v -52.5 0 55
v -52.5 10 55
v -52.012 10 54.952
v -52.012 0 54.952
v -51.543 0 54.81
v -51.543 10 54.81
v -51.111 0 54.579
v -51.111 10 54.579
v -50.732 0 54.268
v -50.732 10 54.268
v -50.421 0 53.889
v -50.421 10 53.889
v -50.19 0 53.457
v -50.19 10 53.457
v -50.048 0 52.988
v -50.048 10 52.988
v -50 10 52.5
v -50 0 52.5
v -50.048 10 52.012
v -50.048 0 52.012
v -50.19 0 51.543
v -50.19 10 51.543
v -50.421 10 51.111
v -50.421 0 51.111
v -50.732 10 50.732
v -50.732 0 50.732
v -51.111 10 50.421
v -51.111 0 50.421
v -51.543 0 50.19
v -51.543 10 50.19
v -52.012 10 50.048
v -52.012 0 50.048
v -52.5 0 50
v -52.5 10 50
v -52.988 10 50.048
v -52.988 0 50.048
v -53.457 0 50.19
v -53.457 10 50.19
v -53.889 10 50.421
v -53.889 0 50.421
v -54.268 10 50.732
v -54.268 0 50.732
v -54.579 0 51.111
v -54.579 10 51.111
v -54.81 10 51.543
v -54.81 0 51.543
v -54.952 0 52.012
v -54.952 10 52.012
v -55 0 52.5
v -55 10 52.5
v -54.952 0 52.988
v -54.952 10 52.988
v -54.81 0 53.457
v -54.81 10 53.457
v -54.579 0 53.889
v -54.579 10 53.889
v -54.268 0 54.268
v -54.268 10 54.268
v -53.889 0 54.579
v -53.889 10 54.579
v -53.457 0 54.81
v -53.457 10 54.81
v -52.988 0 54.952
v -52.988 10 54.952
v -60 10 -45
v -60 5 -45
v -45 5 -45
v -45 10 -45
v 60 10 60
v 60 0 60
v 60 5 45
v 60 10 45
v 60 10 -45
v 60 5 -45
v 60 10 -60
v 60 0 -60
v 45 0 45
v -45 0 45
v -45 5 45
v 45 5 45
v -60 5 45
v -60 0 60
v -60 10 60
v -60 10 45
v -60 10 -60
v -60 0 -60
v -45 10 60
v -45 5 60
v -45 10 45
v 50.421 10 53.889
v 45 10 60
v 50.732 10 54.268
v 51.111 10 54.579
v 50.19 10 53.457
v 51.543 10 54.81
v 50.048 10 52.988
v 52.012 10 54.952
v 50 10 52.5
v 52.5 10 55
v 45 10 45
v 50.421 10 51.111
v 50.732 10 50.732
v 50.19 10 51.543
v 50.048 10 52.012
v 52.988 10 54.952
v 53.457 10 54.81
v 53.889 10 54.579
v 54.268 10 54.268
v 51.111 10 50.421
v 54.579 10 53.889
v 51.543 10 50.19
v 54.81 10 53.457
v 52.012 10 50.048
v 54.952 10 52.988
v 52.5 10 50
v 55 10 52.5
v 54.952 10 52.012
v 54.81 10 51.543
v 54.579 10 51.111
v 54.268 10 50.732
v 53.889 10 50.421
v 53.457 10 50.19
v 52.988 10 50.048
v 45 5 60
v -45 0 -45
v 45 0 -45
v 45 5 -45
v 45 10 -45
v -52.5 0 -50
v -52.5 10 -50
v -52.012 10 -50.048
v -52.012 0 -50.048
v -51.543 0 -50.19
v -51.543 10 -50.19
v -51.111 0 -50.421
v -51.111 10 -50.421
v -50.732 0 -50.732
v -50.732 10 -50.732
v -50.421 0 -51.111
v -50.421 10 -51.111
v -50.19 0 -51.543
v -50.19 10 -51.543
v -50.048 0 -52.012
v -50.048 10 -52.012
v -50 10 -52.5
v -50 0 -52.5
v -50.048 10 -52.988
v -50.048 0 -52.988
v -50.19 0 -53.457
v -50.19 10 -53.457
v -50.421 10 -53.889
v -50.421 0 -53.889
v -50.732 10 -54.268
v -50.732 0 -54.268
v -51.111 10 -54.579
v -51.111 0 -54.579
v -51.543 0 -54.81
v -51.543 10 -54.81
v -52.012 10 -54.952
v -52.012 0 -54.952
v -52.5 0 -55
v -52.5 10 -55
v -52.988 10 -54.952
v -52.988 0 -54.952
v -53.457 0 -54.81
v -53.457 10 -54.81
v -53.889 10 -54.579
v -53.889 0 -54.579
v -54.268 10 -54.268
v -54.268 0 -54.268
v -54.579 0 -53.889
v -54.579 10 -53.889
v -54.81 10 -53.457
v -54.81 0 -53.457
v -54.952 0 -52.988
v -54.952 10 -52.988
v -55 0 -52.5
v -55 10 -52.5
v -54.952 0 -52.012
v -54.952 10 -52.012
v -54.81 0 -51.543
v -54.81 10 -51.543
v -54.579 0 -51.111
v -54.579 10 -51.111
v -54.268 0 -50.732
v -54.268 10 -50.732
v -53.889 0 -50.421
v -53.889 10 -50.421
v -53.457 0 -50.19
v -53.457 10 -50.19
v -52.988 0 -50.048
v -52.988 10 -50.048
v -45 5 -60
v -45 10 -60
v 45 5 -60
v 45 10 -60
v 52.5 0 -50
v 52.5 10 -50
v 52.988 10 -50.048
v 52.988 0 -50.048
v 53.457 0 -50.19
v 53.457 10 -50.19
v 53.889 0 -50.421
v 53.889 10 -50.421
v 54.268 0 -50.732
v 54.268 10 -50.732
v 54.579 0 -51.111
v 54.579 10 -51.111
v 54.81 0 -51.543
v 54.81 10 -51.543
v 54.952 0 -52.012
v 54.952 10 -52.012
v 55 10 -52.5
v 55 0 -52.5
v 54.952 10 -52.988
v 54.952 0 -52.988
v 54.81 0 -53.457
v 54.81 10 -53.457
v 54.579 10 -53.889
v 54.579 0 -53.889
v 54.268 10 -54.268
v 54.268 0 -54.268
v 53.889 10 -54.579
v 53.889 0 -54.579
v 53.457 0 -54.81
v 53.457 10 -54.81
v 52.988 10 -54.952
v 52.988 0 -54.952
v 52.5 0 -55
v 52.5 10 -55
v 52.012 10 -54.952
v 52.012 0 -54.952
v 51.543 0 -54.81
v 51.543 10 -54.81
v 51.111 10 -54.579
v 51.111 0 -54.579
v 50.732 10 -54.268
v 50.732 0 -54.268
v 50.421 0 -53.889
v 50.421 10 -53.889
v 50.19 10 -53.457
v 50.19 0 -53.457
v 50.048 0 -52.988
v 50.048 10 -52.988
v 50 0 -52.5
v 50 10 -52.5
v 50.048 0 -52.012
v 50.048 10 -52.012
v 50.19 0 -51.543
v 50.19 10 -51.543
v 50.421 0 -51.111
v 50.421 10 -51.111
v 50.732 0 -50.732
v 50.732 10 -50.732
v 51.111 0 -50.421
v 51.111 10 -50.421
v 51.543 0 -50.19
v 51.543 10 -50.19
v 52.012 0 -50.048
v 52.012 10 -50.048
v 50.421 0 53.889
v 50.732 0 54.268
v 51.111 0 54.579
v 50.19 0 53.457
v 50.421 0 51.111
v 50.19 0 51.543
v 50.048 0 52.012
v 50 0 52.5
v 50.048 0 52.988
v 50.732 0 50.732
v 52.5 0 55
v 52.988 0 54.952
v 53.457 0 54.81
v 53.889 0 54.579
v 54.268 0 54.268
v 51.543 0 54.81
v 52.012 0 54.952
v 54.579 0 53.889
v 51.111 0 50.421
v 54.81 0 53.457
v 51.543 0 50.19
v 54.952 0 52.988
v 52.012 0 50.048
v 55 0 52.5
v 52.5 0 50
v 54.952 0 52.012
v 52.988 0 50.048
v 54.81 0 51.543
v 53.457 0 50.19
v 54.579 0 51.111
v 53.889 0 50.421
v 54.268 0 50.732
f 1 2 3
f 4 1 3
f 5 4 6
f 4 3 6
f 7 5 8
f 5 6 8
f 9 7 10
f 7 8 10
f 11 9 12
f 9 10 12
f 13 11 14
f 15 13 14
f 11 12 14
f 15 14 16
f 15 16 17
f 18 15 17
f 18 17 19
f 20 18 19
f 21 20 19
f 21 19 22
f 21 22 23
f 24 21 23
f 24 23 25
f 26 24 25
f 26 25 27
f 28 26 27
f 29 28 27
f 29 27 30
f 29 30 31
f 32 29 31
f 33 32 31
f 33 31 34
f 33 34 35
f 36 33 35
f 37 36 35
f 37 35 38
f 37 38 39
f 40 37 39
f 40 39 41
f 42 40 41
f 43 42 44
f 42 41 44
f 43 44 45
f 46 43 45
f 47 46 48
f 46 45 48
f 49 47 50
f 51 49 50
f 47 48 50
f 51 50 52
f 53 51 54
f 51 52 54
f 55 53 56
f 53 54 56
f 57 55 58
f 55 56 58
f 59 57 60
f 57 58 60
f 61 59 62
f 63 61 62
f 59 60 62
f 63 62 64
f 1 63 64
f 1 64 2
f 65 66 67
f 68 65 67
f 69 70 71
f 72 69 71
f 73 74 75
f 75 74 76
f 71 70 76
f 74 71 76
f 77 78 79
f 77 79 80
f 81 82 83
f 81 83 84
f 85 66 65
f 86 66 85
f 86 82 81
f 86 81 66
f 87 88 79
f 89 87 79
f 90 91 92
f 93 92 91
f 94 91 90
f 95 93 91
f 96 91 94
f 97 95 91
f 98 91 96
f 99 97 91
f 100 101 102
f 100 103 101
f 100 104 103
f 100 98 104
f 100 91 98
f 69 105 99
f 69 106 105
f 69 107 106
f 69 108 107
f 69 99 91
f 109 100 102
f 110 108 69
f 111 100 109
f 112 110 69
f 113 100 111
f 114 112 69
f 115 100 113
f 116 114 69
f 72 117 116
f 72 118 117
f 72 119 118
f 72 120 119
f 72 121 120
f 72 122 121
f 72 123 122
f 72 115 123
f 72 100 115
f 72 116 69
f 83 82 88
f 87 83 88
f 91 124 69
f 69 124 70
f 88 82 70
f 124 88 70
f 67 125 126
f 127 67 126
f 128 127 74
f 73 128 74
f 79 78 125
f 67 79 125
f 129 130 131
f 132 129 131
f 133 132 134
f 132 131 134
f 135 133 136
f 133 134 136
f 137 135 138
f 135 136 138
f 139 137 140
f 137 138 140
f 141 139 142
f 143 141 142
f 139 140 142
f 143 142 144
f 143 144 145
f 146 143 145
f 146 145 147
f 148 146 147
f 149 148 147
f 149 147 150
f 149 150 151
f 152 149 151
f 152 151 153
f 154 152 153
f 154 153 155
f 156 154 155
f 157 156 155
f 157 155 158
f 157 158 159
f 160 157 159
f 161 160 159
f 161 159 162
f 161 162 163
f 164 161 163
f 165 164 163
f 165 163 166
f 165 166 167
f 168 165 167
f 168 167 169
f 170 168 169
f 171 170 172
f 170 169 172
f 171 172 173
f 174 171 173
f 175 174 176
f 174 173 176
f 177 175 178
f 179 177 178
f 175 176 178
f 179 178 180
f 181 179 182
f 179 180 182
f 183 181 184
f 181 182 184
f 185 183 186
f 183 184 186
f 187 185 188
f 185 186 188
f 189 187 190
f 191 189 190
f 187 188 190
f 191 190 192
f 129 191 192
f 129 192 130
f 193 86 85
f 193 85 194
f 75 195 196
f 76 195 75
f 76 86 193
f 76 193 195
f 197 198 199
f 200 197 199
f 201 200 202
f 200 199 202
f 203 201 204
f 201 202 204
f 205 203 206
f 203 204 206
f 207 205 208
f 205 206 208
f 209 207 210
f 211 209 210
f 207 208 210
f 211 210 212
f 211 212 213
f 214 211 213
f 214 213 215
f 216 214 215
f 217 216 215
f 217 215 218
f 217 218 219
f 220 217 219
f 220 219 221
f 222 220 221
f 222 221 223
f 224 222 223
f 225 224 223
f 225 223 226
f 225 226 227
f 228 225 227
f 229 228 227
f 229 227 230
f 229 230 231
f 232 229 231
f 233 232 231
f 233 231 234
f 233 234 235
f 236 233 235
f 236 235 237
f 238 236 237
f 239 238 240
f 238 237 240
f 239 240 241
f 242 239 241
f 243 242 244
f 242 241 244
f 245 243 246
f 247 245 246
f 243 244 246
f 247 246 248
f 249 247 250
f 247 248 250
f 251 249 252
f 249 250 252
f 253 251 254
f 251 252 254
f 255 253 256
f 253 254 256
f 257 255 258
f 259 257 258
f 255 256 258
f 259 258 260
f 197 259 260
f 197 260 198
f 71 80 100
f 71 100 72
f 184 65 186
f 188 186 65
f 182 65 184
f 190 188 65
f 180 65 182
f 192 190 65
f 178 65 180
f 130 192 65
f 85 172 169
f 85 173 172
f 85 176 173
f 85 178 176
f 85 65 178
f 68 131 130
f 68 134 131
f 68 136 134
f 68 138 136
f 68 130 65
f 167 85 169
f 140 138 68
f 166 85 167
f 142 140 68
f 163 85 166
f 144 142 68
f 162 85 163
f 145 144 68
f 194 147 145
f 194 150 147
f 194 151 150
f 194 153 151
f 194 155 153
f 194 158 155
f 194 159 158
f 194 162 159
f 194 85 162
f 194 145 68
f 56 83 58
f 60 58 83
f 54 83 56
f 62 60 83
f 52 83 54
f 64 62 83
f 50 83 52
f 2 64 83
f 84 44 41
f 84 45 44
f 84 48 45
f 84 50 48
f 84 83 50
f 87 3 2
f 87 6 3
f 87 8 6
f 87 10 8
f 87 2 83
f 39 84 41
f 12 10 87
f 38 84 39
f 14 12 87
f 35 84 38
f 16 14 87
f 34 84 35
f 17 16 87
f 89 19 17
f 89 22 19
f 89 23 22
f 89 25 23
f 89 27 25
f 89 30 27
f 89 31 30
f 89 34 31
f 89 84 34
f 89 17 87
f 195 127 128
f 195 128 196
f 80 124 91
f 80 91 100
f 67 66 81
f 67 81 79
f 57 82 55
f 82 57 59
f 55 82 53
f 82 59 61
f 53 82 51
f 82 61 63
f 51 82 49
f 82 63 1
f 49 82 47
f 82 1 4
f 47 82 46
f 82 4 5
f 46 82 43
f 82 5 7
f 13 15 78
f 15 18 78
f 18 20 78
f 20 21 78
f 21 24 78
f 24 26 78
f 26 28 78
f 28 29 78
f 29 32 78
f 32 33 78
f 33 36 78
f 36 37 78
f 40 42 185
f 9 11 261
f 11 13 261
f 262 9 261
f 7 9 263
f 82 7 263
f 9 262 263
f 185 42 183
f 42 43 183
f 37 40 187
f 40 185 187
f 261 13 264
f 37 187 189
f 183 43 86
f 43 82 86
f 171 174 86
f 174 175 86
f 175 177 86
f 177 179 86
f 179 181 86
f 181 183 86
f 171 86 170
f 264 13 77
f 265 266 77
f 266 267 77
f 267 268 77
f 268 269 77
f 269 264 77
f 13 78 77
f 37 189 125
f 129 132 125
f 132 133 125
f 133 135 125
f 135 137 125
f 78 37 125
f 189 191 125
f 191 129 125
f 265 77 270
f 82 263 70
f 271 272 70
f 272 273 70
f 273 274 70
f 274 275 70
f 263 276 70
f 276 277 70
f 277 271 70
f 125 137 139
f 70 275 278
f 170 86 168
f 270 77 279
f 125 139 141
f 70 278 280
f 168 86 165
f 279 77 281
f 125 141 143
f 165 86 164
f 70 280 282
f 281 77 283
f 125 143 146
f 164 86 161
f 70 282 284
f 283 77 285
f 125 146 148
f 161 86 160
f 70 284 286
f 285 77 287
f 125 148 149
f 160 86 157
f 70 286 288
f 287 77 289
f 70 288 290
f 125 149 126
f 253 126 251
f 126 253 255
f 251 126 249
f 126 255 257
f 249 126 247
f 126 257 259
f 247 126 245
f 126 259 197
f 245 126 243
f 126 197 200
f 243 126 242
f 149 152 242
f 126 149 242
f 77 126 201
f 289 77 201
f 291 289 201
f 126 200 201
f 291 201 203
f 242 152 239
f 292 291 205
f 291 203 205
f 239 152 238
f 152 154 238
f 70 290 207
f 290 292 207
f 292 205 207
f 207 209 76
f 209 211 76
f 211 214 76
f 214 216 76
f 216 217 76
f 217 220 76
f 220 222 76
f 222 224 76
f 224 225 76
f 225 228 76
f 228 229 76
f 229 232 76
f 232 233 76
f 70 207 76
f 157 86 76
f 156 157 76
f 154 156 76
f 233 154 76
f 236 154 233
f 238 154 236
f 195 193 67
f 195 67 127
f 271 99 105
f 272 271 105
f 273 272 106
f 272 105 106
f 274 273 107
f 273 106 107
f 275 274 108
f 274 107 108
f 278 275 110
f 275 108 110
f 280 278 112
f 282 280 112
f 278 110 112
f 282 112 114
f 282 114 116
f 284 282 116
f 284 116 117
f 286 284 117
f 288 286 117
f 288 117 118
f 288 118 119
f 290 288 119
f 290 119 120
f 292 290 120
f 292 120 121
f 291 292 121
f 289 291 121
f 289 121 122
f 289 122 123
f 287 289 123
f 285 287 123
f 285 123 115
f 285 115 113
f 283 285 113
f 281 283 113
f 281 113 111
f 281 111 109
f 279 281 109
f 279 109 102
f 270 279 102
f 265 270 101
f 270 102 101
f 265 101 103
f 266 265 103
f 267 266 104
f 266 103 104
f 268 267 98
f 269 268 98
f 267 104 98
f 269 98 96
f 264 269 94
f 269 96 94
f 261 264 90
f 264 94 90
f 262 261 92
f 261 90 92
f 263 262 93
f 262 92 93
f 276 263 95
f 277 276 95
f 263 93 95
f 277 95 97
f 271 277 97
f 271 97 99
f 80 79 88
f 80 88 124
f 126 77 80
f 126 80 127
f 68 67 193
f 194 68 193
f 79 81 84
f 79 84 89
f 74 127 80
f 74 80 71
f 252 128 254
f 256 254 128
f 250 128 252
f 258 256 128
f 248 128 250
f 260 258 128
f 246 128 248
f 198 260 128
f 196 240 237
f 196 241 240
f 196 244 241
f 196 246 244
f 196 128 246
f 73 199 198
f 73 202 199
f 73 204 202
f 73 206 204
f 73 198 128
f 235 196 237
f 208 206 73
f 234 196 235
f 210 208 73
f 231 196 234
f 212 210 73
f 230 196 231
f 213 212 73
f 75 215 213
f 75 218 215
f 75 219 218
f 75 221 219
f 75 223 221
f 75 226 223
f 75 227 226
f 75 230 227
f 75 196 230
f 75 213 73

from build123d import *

# Parameters (mm, degrees)
SKETCH2_W           = 120
SKETCH2_H           = 120
SKETCH2_W_2         = 90
SKETCH2_H_2         = 90
BOSS_EXTRUDE1_DEPTH = 5
SKETCH3_W           = 15
SKETCH3_H           = 15
BOSS_EXTRUDE2_DEPTH = 5
SKETCH4_R           = 2.5
CUT_EXTRUDE1_DEPTH  = 86.440037453


with BuildPart() as part:
    # Sketch2 → Boss-Extrude1 (new body)
    with BuildSketch(Plane(origin=(0, 0, 0), x_dir=(1, 0, 0), z_dir=(0, 1, 0))):
        Rectangle(SKETCH2_W, SKETCH2_H)
        Rectangle(SKETCH2_W_2, SKETCH2_H_2, mode=Mode.SUBTRACT)
    extrude(amount=BOSS_EXTRUDE1_DEPTH)

    # Sketch3 → Boss-Extrude2 (add)
    with BuildSketch(Plane(origin=(0, 5, 0), x_dir=(1, 0, 0), z_dir=(0, 1, 0))):
        with Locations((52.5, 52.5)):
            Rectangle(SKETCH3_W, SKETCH3_H)
        with Locations((-52.5, 52.5)):
            Rectangle(SKETCH3_W, SKETCH3_H)
        with Locations((52.5, -52.5)):
            Rectangle(SKETCH3_W, SKETCH3_H)
        with Locations((-52.5, -52.5)):
            Rectangle(SKETCH3_W, SKETCH3_H)
    extrude(amount=BOSS_EXTRUDE2_DEPTH)

    # Sketch4 → Cut-Extrude1 (cut, through all)
    with BuildSketch(Plane(origin=(0, 10, 0), x_dir=(1, 0, 0), z_dir=(0, 1, 0))):
        with Locations(Location((-52.5, -52.5, 0), (0, 0, 270))):
            Circle(SKETCH4_R)
        with Locations(Location((-52.5, 52.5, 0), (0, 0, 270))):
            Circle(SKETCH4_R)
        with Locations(Location((52.5, 52.5, 0), (0, 0, 270))):
            Circle(SKETCH4_R)
        with Locations(Location((52.5, -52.5, 0), (0, 0, 270))):
            Circle(SKETCH4_R)
    extrude(amount=-CUT_EXTRUDE1_DEPTH, mode=Mode.SUBTRACT)


solid = part.part
